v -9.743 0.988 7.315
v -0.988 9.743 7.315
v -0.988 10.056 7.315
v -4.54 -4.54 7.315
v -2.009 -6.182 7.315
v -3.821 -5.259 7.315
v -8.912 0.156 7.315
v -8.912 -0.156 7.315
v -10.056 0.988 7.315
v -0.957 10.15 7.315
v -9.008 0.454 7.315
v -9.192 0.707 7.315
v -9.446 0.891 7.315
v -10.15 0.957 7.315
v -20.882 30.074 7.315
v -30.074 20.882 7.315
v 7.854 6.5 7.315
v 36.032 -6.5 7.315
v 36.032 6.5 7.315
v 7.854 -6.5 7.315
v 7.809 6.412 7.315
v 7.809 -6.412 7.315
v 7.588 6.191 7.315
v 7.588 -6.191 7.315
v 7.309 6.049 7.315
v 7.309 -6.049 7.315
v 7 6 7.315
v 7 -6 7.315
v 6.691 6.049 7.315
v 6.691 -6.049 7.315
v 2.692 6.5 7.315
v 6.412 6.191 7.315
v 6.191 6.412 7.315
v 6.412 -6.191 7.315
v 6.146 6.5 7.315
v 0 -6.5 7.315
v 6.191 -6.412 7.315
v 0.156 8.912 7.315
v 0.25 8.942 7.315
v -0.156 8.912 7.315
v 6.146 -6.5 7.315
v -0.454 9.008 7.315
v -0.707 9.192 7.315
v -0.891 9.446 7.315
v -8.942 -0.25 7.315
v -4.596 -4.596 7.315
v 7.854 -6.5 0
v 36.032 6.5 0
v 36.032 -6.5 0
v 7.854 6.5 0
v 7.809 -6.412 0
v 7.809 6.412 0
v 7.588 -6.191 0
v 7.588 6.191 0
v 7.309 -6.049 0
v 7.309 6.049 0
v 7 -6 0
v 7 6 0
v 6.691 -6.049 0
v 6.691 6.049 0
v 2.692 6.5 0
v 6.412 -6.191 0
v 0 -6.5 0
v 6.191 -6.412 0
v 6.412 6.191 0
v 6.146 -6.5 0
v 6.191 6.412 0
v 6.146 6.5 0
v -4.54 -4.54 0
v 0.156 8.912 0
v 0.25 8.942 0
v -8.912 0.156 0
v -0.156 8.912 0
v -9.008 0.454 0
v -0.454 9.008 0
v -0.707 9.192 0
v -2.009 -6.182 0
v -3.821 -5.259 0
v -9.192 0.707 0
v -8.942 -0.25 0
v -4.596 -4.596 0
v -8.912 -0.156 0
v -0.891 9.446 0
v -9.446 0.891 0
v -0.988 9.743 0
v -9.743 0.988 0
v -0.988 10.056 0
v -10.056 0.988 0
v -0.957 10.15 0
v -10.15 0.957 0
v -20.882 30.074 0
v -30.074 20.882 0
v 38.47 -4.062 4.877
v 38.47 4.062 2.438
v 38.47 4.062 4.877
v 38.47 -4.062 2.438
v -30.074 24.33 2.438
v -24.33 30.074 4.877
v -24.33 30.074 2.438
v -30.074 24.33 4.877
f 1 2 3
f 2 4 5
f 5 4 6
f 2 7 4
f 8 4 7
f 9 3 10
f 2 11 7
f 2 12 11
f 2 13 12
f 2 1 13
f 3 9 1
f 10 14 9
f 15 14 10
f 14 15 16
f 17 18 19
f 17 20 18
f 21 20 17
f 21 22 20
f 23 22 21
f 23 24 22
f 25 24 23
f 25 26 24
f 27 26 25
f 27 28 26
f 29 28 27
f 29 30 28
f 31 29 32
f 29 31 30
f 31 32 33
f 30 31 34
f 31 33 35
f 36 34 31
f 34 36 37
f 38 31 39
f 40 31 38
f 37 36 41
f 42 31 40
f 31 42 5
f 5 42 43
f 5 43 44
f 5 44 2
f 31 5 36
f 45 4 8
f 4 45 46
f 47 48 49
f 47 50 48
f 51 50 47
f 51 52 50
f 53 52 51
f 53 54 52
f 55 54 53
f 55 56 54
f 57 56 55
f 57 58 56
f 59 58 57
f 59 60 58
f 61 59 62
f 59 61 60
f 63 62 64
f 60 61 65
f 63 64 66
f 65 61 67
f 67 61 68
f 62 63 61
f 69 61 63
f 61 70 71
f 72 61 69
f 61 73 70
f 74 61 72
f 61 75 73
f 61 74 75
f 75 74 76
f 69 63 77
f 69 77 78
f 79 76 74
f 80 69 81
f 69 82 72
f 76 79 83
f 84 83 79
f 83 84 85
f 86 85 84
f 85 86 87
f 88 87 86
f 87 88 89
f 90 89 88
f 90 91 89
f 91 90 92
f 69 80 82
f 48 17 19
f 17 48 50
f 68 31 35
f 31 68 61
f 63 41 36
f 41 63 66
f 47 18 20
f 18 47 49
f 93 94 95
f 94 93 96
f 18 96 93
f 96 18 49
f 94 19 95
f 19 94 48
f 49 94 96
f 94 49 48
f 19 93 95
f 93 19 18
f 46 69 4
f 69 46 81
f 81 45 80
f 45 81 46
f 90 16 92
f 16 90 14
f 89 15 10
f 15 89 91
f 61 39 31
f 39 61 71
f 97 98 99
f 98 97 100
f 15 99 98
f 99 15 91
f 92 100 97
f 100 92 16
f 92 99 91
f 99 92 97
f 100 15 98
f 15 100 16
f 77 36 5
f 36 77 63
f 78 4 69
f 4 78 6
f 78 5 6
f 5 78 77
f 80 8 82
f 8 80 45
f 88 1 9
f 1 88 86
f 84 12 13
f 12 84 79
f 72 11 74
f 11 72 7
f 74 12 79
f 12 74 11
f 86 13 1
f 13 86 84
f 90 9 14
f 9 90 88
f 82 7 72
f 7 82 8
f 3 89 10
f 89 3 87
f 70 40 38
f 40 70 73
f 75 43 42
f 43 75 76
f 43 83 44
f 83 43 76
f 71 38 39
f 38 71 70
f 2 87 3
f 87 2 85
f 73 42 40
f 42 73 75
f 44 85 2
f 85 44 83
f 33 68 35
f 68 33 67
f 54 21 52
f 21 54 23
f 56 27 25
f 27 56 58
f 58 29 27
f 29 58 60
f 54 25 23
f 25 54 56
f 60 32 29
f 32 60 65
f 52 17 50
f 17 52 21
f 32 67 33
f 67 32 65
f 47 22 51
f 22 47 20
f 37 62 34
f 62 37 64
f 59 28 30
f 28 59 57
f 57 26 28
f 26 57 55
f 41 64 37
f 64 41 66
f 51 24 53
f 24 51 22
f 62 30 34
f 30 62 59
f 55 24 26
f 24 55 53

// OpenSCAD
// This thing allows you to create corners, tees, crosses, 
// and splices for fixing up your window screens.
//
// This is licensed under the creative commons+attribution licence
// To fulfil the attribution requirement, please link to:
//		http://www.thingiverse.com/thing:897599

/* [Main] */

// what shape of screen connector
shape=0; // [0:corner,1:splice,2:tee,3:four way]

// the style of the screen connector
style=1; // [0:mitre,1:straight_end]

// how wide part is in mm
width=13.0;

// measurement from the edge to the corner in mm
depth_to_corner=25.47;

// how thick part is in mm
thickness=7.315;

// The angle of the joint in degrees (only works for corner)
angle=135;

/* [Advanced] */

// This makes it look nicer, but can make printablility more complex
outer_thickness=0;

/* [Hidden] */

module end(bevel,width,depth,thickness){
	translate([0,-width/2,0]) cube([depth-bevel,width,thickness]);
	translate([depth-bevel/2,0,thickness/2]) rotate([0,-90,0]) frustum(thickness,width,thickness-bevel*2,width-bevel*2,bevel);
}

module old_mitre_style(){
	outside_corner_r=width/6;
	inside_corner_r=width/18;
	bevel=thickness/3;
	translate([0,0,-thickness/2]) linear_extrude(thickness) {
		difference(){
			union(){
				translate([0,bevel-depth_to_corner,0]) square([width,depth_to_corner-bevel]);
				rotate([0,0,90]) square([width,depth_to_corner-bevel]);
				translate([width-outside_corner_r,width-outside_corner_r,0]) circle(r=outside_corner_r,$fn=20);
				square([width-outside_corner_r,width]);
				square([width,width-outside_corner_r]);
			}
			circle(r=inside_corner_r,$fn=20);
		}
	}
	translate([bevel/2-depth_to_corner,width/2,0]) rotate([0,90,0]) frustum(thickness,width,thickness-bevel*2,width-bevel*2,bevel);
	translate([width/2,bevel/2-depth_to_corner,0]) rotate([0,0,90]) rotate([0,90,0]) frustum(thickness,width,thickness-bevel*2,width-bevel*2,bevel);
}



module frustum(w,h,w2,h2,d){
	hull(){
		translate([-w/2,-h/2,d/2]) cube([w,h,0.01]);
		translate([-w2/2,-h2/2,-d/2]) cube([w2,h2,0.01]);
	}
}

module reliefs(angle,r=1,$fn=20){
	n=width/2+r/2;
	translate([ n, n,-1]) cylinder(r=r,h=thickness+2);
	translate([-n,-n,-1]) cylinder(r=r,h=thickness+2);
	translate([ n,-n,-1]) cylinder(r=r,h=thickness+2);
	rotate([0,0,angle]) {
		translate([ n, n,-1]) cylinder(r=r,h=thickness+2);
		//translate([-n,-n,-1]) cylinder(r=r,h=thickness+2);
		translate([ n,-n,-1]) cylinder(r=r,h=thickness+2);
	}
}

difference(){
	union(){
		if(shape==0){ //corner
			end(thickness/3,width,depth_to_corner+width,thickness,mitre=style==0);
			rotate([0,0,angle]) end(thickness/3,width,depth_to_corner+width,thickness);
			if(style==0||((angle%90)!=0)){
				cylinder(r=width/2,h=thickness,$fn=20);
			}else{
				translate([-width/2,-width/2,-outer_thickness]) cube([width,width,thickness+2*outer_thickness]);
			}
		}
		if(shape==1){ // straight (only miter style/no connector)
			end(thickness/3,width,depth_to_corner,thickness);
			rotate([0,0,180]) end(thickness/3,width,depth_to_corner,thickness);
		}
		if(shape==2){ // 3-way (always non-miter style)
			end(thickness/3,width,depth_to_corner+width,thickness);
			rotate([0,0,90]) end(thickness/3,width,depth_to_corner+width,thickness);
			rotate([0,0,180]) end(thickness/3,width,depth_to_corner+width,thickness);
			translate([-width/2,-width/2,-(outer_thickness-thickness)/2]) cube([width,width,outer_thickness]);
		}
		if(shape==3){ // 4-way (always non-miter style)
			end(thickness/3,width,depth_to_corner+width,thickness);
			rotate([0,0,90]) end(thickness/3,width,depth_to_corner+width,thickness);
			rotate([0,0,180]) end(thickness/3,width,depth_to_corner+width,thickness);
			rotate([0,0,-90]) end(thickness/3,width,depth_to_corner+width,thickness);
			translate([-width/2,-width/2,-(outer_thickness-thickness)/2]) cube([width,width,outer_thickness]);
		}
	}
	reliefs(angle);
}
